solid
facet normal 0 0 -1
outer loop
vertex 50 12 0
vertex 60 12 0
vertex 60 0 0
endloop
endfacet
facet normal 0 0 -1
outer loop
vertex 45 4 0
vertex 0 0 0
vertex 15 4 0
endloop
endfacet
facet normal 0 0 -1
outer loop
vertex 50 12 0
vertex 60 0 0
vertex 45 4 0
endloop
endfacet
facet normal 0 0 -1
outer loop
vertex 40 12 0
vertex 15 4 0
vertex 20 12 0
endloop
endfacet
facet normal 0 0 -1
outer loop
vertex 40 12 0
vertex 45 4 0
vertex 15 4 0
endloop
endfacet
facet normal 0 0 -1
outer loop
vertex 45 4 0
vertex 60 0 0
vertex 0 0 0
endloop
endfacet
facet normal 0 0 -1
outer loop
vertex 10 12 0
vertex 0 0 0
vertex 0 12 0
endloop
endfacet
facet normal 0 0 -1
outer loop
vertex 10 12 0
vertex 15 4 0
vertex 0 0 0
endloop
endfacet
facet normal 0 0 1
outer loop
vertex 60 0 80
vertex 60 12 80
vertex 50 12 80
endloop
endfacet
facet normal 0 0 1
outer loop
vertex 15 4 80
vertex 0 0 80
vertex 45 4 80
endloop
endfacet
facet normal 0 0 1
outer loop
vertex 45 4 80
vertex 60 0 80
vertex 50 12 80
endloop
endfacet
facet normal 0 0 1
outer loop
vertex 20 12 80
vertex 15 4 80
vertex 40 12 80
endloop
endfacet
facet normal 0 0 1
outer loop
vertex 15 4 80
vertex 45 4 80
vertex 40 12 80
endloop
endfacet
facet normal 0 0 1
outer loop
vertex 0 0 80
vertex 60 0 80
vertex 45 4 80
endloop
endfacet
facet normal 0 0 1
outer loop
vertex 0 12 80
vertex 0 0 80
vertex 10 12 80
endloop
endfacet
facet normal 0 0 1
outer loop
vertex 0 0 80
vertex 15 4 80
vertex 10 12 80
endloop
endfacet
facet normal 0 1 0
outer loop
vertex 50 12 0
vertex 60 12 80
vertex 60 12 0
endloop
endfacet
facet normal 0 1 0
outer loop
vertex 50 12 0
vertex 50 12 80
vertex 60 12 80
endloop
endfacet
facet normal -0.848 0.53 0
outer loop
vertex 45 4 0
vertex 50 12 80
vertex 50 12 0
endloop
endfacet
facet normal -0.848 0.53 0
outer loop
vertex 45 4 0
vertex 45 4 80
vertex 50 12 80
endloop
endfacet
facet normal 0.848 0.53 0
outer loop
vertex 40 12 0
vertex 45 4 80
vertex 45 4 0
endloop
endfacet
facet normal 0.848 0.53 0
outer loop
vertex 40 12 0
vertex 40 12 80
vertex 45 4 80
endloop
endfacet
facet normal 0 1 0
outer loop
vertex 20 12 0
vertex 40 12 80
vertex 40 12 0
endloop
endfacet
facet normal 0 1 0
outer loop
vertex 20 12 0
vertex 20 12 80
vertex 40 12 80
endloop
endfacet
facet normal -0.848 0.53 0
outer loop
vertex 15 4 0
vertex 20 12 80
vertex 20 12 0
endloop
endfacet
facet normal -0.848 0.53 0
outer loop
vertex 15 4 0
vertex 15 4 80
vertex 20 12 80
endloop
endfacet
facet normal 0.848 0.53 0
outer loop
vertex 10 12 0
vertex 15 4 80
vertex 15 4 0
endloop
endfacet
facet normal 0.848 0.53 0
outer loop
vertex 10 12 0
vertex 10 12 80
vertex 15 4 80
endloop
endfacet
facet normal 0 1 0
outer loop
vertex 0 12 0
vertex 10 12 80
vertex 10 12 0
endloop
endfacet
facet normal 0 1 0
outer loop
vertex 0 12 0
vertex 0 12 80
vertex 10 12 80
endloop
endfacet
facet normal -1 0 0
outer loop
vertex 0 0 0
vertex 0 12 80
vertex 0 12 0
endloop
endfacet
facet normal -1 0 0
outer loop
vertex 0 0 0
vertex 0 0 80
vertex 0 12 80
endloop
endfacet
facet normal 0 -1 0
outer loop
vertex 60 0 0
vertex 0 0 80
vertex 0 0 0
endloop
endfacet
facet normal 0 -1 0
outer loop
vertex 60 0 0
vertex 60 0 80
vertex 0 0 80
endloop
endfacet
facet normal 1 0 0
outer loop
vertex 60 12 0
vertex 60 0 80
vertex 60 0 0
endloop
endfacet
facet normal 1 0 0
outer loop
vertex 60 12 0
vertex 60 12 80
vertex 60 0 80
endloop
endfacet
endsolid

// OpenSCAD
$fn = 32;

// ----------------------------------------------------------------------
// V guide rail: doublev, 60 mm wide
// ----------------------------------------------------------------------

// --- parameters (mm) ---
rail_w = 60;              // rail width, X
base_t = 12;              // base plate thickness
v_depth = 8;              // V feature depth / height
v_half_w = 10;            // half width of the V at the base face
plate_t = 80;             // rail length, Z (the extrusion height)
groove_off = 15;          // offset of each groove from the centreline
fit_tol = 0.05;           // declared fit tolerance (prompt contract)
free_tol = 0.3;           // declared free tolerance (prompt contract)

centre_x = rail_w / 2;  // rail centreline
groove_a = centre_x - groove_off;  // axis of the first groove
groove_b = centre_x + groove_off;  // axis of the second groove

profile = [[0, 0], [60, 0], [60, 12], [50, 12], [45, 4], [40, 12], [20, 12], [15, 4], [10, 12], [0, 12]];  // primary outline, 10 points, counter clockwise

// --- the one profile operation ---
linear_extrude(height = plate_t) polygon(points = profile);
